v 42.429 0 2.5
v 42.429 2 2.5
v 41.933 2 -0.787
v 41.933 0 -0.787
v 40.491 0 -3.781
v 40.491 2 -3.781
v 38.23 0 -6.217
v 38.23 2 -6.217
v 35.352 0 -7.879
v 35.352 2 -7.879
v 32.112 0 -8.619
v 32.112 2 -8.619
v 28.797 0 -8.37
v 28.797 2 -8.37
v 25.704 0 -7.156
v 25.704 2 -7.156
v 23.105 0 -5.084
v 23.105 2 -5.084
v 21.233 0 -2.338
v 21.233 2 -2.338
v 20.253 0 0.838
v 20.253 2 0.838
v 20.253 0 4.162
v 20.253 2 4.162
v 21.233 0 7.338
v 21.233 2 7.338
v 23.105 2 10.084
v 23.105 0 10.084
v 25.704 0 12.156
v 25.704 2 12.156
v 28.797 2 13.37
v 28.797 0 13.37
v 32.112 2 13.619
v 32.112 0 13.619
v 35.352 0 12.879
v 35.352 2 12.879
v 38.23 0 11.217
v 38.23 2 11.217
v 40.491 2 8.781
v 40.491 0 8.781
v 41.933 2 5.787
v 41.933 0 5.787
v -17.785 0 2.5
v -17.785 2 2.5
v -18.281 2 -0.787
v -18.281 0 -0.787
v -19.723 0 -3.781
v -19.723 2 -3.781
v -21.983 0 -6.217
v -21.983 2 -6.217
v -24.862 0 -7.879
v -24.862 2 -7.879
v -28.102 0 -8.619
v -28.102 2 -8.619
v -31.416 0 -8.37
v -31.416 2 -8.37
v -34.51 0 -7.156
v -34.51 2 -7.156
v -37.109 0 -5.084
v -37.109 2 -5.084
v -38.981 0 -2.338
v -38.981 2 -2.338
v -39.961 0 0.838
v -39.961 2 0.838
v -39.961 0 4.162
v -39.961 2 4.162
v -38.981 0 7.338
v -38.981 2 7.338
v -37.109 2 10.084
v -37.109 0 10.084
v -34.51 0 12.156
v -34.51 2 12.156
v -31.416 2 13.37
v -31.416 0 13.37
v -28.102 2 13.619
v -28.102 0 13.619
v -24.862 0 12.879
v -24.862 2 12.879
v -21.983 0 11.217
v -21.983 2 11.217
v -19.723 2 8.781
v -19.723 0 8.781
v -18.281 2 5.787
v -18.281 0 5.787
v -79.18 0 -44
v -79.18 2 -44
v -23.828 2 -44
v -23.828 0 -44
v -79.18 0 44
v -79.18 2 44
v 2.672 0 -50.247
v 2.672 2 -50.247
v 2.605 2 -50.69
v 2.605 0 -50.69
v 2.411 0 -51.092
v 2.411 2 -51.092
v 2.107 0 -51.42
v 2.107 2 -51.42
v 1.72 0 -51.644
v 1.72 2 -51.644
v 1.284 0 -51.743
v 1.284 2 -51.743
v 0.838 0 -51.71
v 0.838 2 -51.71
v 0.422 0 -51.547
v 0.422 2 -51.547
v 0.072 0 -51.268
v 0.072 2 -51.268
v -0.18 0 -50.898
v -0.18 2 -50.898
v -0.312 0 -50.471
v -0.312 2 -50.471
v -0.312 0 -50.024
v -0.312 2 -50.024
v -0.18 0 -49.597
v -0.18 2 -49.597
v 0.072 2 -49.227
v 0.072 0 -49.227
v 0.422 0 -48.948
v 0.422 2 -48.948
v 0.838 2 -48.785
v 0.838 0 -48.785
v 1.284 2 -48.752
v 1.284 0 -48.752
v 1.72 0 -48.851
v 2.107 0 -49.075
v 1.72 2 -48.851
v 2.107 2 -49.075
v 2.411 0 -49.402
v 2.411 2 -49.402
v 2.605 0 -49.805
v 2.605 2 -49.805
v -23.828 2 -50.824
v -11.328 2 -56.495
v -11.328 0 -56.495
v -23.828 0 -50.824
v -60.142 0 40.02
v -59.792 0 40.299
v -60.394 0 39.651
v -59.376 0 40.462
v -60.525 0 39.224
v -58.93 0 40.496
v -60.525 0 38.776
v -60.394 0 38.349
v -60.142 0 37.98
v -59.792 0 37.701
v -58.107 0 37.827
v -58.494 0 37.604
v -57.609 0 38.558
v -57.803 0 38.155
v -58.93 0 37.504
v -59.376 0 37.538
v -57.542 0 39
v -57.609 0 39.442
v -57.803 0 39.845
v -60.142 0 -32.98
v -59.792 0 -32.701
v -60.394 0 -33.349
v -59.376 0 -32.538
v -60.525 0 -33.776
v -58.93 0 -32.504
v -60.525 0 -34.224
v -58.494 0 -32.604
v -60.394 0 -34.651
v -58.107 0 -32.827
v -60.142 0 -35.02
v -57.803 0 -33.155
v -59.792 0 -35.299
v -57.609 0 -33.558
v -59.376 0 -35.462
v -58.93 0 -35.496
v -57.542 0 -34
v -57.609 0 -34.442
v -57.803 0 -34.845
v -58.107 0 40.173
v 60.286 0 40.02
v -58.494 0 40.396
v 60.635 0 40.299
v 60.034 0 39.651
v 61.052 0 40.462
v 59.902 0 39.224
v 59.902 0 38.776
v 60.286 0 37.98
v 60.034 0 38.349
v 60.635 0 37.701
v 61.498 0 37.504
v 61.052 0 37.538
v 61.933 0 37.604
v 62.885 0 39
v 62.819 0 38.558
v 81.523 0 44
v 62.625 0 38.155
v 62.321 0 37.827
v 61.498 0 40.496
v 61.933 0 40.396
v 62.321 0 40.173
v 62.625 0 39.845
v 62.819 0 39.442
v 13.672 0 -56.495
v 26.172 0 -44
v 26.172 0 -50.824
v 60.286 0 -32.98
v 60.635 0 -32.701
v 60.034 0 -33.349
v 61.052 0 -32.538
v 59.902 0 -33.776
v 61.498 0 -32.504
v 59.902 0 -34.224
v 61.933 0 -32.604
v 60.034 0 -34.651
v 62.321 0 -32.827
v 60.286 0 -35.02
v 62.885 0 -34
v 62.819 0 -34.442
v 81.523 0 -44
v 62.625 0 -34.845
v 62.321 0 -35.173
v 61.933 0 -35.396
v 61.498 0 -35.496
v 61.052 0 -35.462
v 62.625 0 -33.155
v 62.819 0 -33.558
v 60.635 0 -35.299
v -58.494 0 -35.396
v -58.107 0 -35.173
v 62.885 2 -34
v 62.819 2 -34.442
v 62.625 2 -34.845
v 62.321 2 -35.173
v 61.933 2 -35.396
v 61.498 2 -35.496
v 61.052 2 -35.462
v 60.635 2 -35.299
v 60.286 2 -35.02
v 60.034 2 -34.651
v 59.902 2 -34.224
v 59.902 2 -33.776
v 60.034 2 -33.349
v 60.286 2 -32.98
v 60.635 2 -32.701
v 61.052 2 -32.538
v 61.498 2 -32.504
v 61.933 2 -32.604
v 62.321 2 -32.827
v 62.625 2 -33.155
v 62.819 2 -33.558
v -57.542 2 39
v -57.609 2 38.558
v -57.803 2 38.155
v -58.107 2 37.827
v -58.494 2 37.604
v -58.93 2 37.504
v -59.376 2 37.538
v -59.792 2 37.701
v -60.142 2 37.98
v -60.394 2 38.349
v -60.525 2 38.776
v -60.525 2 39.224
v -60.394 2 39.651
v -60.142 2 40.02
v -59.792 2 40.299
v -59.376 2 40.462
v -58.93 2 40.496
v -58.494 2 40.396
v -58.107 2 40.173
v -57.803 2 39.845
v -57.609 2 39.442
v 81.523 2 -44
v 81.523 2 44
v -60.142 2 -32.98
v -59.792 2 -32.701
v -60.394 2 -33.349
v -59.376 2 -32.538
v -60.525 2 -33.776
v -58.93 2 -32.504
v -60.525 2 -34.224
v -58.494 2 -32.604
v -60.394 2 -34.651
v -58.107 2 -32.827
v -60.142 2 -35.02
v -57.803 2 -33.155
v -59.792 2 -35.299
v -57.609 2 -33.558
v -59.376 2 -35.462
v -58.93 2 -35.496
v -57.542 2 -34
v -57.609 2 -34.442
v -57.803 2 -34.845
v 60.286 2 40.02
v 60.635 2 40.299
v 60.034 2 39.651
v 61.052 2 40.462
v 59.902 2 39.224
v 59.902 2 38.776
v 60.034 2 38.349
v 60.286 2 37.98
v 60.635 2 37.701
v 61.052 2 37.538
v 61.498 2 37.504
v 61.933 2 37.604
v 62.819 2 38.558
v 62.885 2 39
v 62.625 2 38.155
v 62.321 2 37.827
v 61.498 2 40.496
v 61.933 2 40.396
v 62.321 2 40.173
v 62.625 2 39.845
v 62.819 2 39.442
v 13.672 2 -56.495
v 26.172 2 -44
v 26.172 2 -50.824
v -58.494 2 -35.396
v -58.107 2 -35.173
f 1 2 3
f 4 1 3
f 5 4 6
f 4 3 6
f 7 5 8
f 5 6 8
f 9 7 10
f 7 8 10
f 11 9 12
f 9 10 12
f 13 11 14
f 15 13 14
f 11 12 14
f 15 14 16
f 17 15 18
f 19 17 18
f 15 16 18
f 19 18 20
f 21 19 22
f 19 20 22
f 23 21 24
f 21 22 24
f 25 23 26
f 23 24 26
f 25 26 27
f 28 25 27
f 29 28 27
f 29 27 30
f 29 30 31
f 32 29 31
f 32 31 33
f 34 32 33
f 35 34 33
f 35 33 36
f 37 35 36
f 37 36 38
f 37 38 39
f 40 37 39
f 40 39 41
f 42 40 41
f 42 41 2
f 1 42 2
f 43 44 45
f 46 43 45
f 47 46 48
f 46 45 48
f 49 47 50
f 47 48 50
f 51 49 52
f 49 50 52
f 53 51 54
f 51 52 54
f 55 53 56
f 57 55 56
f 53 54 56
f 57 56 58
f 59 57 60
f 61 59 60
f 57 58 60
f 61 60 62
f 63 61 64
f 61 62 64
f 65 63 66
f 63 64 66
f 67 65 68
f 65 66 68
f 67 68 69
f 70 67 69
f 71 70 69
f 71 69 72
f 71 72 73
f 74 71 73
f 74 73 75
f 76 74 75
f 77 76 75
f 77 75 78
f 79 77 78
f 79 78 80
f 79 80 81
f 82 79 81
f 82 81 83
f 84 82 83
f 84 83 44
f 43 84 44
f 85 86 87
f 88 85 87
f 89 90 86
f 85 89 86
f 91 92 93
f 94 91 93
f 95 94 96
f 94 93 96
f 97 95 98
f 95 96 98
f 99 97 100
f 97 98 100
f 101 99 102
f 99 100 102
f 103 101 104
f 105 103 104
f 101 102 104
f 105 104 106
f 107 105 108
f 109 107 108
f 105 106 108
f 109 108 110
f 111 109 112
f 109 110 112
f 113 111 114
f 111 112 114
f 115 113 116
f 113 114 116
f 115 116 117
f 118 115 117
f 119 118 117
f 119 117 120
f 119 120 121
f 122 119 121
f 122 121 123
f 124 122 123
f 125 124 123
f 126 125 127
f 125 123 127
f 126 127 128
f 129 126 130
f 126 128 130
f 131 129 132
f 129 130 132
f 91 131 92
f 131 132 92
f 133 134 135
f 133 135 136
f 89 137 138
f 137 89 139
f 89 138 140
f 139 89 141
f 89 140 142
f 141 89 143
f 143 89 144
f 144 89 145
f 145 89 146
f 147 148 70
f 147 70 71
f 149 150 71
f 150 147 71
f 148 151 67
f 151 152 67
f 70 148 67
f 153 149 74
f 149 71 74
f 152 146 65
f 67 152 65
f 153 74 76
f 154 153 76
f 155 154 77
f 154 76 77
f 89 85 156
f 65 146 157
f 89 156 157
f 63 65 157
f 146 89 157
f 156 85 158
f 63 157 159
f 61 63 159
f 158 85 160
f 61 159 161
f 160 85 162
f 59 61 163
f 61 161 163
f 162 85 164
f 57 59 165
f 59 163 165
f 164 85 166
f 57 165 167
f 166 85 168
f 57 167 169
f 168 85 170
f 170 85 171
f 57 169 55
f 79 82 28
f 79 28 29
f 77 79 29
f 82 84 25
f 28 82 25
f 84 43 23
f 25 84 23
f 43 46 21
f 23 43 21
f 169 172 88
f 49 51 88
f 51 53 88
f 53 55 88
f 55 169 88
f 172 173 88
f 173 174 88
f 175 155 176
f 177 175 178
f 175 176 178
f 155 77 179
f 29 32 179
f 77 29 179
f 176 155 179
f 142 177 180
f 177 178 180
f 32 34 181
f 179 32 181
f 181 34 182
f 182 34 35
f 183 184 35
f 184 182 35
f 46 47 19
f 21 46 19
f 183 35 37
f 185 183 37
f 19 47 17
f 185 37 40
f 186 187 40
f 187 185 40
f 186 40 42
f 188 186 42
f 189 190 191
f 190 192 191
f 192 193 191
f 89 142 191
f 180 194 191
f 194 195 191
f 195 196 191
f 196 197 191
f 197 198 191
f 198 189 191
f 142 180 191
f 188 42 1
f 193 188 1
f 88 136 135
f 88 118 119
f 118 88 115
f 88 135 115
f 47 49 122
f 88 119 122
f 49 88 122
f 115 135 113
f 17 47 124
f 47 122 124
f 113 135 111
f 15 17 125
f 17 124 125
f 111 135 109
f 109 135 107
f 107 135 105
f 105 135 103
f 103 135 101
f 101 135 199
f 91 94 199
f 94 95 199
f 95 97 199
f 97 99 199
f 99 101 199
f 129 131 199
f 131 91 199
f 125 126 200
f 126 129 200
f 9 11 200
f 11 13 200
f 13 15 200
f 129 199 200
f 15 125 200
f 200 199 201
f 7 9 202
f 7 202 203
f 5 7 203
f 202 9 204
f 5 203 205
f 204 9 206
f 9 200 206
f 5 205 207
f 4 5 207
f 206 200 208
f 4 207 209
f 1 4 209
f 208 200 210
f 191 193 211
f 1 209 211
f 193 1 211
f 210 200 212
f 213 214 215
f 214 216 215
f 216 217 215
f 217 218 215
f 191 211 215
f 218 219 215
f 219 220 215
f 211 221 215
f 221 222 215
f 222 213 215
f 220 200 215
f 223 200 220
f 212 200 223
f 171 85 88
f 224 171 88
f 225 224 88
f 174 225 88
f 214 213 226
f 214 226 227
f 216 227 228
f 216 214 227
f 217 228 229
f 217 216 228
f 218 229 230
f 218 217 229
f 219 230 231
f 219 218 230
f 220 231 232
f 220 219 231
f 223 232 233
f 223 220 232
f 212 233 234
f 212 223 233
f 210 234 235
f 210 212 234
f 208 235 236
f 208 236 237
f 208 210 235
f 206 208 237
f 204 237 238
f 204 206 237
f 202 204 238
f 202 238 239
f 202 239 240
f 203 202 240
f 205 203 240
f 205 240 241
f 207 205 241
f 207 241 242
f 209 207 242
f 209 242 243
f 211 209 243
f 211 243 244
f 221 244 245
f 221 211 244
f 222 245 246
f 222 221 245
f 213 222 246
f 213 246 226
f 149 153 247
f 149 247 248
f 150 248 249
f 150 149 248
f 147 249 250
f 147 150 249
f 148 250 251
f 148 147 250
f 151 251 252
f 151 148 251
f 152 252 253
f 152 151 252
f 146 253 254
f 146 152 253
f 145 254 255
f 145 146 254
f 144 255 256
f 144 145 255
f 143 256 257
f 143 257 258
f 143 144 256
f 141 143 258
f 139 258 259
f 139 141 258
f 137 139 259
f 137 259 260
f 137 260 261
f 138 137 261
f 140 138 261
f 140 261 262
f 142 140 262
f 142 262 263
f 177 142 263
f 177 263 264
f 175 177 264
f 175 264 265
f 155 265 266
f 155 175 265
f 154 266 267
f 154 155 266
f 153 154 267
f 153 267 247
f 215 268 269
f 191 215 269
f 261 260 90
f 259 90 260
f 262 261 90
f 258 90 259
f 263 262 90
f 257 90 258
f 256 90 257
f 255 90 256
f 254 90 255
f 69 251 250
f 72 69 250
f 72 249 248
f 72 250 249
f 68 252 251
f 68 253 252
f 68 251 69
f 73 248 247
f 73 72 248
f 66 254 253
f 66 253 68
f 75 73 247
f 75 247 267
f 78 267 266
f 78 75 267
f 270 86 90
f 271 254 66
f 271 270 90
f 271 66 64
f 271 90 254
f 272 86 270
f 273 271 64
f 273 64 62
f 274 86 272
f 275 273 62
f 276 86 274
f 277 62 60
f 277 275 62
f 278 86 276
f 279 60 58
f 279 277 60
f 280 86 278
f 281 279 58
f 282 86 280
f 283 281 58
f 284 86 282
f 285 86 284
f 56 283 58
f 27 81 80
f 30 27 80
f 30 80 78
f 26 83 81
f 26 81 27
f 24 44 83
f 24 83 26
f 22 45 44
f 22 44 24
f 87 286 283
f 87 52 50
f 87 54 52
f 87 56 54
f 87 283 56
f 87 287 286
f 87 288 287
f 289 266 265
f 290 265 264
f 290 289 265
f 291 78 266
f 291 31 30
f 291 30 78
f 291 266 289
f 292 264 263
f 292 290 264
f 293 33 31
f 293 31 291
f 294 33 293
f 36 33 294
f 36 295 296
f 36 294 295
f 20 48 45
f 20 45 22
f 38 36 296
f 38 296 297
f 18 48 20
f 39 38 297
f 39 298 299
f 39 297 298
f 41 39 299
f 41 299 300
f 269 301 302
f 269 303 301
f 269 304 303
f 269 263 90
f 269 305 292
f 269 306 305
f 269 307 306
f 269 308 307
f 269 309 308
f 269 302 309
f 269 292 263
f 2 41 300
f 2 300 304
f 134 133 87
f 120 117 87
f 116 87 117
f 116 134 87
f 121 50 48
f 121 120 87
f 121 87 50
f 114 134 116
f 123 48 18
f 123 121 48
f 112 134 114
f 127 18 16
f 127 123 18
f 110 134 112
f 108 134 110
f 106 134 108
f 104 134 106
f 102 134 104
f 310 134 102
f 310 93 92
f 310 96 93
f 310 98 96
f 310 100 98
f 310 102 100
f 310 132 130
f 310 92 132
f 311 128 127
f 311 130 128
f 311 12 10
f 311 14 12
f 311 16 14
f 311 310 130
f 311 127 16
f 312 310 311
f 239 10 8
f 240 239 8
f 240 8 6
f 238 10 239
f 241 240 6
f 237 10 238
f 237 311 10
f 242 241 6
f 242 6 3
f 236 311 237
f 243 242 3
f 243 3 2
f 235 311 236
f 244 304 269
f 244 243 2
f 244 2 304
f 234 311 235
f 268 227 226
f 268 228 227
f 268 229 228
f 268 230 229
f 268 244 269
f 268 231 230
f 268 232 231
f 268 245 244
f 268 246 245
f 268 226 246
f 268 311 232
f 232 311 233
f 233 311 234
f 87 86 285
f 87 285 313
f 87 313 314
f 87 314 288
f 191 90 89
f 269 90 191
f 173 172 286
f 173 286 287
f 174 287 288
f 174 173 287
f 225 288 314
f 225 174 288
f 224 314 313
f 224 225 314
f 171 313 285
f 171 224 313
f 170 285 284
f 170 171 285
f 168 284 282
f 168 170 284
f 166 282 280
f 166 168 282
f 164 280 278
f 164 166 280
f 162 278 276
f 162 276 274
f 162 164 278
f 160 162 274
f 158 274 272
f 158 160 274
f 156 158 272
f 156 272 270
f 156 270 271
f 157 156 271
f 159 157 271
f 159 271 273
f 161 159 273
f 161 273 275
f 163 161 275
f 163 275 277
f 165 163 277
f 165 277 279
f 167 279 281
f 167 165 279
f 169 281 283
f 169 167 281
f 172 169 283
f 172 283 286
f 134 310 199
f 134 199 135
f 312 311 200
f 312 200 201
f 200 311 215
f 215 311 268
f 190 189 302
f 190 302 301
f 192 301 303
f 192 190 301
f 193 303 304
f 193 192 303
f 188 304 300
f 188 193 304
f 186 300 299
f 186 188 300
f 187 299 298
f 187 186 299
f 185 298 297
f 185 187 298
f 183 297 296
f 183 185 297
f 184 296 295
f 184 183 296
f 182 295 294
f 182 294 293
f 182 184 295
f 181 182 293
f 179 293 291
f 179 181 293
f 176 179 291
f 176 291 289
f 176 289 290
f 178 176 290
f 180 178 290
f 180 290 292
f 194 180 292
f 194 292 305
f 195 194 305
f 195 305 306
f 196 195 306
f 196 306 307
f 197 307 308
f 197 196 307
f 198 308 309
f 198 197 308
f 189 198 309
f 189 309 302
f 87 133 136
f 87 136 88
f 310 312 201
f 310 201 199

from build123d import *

# Parameters (mm, degrees)
SKETCH1_W           = 155.702807198
SKETCH1_H           = 58
SKETCH1_R           = 1.5
BOSS_EXTRUDE2_DEPTH = 2
SKETCH2_W           = 5
SKETCH2_H           = 88
BOSS_EXTRUDE3_DEPTH = 2
SKETCH3_R           = 11.15
CUT_EXTRUDE1_DEPTH  = 10
SKETCH4_R           = 1.5
BOSS_EXTRUDE4_DEPTH = 2
SKETCH7_W           = 1.5
SKETCH7_H           = 88
SKETCH7_H_2         = 87.852132556
CUT_EXTRUDE2_DEPTH  = 10
SKETCH8_W           = 0.36402546
SKETCH8_H           = 0.147867444
SKETCH8_W_2         = 1.5
SKETCH8_W_3         = 1
SKETCH8_H_2         = 88
CUT_EXTRUDE5_DEPTH  = 66.5


with BuildPart() as part:
    # Sketch1 → Boss-Extrude2 (new body)
    with BuildSketch(Plane(origin=(0, 0, 0), x_dir=(1, 0, 0), z_dir=(0, 1, 0))):
        with Locations((1.171695753, -5)):
            Rectangle(SKETCH1_W, SKETCH1_H)
        Polygon((-76.679707846, 44), (-76.679707846, 24), (79.023099352, 24), (79.023099352, 44), (62.885457038, 44), (59.885457038, 44), (-57.542065533, 44), (-60.542065533, 44), align=None)
        with Locations((-59.042065533, 34)):
            Circle(SKETCH1_R, mode=Mode.SUBTRACT)
        with Locations((61.385457038, 34)):
            Circle(SKETCH1_R, mode=Mode.SUBTRACT)
        Polygon((-76.679707846, -44), (-60.542065533, -44), (-57.542065533, -44), (59.885457038, -44), (62.885457038, -44), (79.023099352, -44), (79.023099352, -34), (-76.679707846, -34), align=None)
        with Locations((-59.042065533, -39)):
            Circle(SKETCH1_R, mode=Mode.SUBTRACT)
        with Locations((61.385457038, -39)):
            Circle(SKETCH1_R, mode=Mode.SUBTRACT)
    extrude(amount=BOSS_EXTRUDE2_DEPTH)

    # Sketch2 → Boss-Extrude3 (add)
    with BuildSketch(Plane(origin=(0, 2, 0), x_dir=(1, 0, 0), z_dir=(0, 1, 0))):
        with Locations((81.523099352, 0)):
            Rectangle(SKETCH2_W, SKETCH2_H)
        with Locations((-79.179707846, 0)):
            Rectangle(SKETCH2_W, SKETCH2_H)
    extrude(amount=-BOSS_EXTRUDE3_DEPTH)

    # Sketch3 → Cut-Extrude1 (cut)
    with BuildSketch(Plane(origin=(0, 2, 0), x_dir=(1, 0, 0), z_dir=(0, 1, 0))):
        with Locations((-28.93518489, -2.5)):
            Circle(SKETCH3_R)
        with Locations((31.278576395, -2.5)):
            Circle(SKETCH3_R)
    extrude(amount=-CUT_EXTRUDE1_DEPTH, mode=Mode.SUBTRACT)

    # Sketch4 → Boss-Extrude4 (add)
    with BuildSketch(Plane(origin=(0, 2, 0), x_dir=(1, 0, 0), z_dir=(0, 1, 0))):
        Polygon((-23.828304247, 44), (26.171695753, 44), (26.171695753, 50.823606938), (13.671695753, 56.49492606), (-11.328304247, 56.49492606), (-23.828304247, 50.823606938), align=None)
        with Locations((1.171695753, 50.24746303)):
            Circle(SKETCH4_R, mode=Mode.SUBTRACT)
    extrude(amount=-BOSS_EXTRUDE4_DEPTH)

    # Sketch7 → Cut-Extrude2 (cut)
    with BuildSketch(Plane(origin=(0, 2, 0), x_dir=(1, 0, 0), z_dir=(0, 1, 0))):
        with Locations((-80.929707846, 0)):
            Rectangle(SKETCH7_W, SKETCH7_H)
        with Locations((83.273099352, 0.073933722)):
            Rectangle(SKETCH7_W, SKETCH7_H_2)
    extrude(amount=-CUT_EXTRUDE2_DEPTH, mode=Mode.SUBTRACT)

    # Sketch8 → Cut-Extrude5 (cut)
    with BuildSketch(Plane(origin=(0, 2, 0), x_dir=(1, 0, 0), z_dir=(0, 1, 0))):
        with Locations((82.341086622, -43.926066278)):
            Rectangle(SKETCH8_W, SKETCH8_H)
        with Locations((83.273099352, -43.926066278)):
            Rectangle(SKETCH8_W_2, SKETCH8_H)
        Polygon((81.523099352, 44), (81.523099352, -44), (82.159073892, -44), (82.159073892, -43.852132556), (82.523099352, -43.852132556), (82.523099352, 44), align=None)
        with Locations((-79.679707846, 0)):
            Rectangle(SKETCH8_W_3, SKETCH8_H_2)
    extrude(amount=-CUT_EXTRUDE5_DEPTH, mode=Mode.SUBTRACT)


solid = part.part
